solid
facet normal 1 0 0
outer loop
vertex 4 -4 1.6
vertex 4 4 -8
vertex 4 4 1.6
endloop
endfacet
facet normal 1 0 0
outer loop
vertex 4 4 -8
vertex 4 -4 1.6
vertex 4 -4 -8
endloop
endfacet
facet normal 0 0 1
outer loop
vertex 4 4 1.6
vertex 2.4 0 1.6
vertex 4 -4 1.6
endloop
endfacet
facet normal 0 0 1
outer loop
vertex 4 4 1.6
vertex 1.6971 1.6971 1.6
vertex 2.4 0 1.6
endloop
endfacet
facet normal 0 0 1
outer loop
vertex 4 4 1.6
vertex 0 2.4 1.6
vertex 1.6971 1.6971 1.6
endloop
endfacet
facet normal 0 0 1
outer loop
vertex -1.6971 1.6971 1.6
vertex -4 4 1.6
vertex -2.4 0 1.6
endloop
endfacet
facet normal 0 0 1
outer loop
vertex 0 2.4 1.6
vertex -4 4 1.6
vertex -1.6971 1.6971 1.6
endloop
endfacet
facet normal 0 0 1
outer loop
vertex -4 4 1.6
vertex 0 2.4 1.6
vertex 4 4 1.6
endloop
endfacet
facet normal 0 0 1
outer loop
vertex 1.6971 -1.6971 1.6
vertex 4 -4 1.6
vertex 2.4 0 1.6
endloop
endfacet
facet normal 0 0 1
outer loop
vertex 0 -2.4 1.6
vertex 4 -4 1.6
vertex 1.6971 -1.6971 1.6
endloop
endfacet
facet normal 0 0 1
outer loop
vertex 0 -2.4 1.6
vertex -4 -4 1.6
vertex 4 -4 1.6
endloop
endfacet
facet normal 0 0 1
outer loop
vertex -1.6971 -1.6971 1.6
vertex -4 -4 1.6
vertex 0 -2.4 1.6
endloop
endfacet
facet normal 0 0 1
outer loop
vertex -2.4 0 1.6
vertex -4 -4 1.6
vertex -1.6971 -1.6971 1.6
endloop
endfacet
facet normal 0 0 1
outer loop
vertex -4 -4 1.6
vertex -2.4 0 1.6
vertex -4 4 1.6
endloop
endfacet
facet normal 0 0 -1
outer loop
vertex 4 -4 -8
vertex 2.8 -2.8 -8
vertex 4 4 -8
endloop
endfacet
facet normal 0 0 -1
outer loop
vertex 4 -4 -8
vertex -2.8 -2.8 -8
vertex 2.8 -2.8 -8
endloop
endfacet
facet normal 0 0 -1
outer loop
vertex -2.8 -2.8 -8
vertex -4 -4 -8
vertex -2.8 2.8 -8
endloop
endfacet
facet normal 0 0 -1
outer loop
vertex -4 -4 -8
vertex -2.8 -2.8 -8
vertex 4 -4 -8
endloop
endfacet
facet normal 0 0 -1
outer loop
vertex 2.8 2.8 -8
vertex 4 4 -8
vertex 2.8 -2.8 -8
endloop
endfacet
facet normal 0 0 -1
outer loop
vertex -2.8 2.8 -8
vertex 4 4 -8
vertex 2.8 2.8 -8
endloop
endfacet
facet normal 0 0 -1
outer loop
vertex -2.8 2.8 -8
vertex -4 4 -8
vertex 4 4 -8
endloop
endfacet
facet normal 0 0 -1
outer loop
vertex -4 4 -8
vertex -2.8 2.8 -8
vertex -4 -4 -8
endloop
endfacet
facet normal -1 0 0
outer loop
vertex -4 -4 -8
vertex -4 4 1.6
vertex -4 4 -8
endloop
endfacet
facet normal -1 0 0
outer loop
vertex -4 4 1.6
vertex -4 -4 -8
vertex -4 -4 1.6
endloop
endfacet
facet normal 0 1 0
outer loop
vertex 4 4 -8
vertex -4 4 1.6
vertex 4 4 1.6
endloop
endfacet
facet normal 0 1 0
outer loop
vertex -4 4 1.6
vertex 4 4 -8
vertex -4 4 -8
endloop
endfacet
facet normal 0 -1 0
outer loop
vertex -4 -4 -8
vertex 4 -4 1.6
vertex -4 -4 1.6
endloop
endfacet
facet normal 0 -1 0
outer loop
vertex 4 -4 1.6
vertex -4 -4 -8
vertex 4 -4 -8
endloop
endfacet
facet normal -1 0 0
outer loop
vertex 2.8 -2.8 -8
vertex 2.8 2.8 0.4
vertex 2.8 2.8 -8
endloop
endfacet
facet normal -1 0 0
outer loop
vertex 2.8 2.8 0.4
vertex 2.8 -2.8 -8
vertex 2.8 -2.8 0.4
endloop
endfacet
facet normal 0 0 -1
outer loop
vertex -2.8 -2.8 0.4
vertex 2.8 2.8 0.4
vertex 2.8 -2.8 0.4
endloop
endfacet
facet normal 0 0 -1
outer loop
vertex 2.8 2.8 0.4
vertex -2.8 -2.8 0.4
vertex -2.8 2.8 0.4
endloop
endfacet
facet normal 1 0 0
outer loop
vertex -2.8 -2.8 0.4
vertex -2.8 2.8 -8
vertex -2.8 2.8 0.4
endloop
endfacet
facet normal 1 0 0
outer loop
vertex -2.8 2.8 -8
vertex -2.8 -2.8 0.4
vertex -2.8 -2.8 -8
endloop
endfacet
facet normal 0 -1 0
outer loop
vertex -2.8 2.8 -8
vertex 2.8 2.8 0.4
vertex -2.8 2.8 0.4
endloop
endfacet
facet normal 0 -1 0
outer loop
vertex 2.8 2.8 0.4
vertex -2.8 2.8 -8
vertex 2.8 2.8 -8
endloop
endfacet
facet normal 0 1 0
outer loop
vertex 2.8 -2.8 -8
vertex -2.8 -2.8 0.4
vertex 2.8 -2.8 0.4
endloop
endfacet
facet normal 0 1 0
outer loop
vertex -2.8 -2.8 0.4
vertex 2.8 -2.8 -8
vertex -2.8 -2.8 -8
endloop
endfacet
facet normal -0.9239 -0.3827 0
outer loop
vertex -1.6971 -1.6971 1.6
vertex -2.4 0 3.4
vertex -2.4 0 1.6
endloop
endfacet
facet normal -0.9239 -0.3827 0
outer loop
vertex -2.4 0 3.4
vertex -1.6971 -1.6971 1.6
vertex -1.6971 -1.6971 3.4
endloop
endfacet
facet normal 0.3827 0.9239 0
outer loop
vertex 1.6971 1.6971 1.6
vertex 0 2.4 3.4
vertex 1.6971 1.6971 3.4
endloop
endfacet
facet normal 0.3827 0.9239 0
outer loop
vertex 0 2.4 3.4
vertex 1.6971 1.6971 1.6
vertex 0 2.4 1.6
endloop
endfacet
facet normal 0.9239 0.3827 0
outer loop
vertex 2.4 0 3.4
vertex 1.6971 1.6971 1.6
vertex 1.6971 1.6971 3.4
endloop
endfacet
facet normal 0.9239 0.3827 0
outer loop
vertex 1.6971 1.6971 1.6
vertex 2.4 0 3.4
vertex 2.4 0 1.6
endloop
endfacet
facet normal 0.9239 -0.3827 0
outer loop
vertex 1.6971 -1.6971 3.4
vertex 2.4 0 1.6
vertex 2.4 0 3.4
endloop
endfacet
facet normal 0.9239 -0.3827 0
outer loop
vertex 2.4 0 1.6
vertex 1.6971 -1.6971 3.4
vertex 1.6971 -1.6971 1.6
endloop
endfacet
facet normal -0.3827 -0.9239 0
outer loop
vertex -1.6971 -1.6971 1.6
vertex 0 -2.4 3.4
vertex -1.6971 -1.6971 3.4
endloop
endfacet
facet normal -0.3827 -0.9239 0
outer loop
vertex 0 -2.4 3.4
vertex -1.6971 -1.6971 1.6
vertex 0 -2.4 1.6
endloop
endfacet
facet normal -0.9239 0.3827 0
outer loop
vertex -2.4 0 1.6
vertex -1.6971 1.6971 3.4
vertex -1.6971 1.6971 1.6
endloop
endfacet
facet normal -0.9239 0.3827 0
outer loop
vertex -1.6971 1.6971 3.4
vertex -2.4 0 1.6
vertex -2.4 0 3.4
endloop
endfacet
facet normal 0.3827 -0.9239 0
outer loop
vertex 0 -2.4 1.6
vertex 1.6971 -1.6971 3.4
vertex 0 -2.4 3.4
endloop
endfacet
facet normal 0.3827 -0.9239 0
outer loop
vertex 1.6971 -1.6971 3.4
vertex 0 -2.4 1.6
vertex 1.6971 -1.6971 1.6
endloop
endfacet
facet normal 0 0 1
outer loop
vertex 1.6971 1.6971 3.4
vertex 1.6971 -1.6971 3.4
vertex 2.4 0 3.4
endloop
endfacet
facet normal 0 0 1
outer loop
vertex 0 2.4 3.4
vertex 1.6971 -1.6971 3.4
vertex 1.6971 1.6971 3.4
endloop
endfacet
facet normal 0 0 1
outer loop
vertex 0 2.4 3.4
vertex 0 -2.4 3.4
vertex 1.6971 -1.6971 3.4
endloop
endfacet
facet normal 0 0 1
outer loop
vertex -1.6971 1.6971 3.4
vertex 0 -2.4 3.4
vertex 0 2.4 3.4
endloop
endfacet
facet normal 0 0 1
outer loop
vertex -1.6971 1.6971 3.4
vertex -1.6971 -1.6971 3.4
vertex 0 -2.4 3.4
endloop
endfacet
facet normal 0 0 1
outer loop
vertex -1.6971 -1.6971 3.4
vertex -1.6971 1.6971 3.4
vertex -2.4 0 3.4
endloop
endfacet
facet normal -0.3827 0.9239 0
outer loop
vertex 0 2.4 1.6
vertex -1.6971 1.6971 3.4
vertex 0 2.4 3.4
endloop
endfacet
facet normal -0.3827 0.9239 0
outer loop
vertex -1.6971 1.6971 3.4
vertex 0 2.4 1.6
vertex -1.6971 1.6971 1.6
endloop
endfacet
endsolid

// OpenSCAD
/**
 * Lego brick
 * @author Jakub Prusa
 * @documentation http://cdn.instructables.com/F65/PI3W/HDYZBK5Y/F65PI3WHDYZBK5Y.LARGE.jpg
 * @param num_x pocet pinu na ose x
 * @param num_y pocet pinu na ose y
 * @param num_z vyska na ose z ale ne v mm ale v jednotkach lega, obycejny dil ma vysky 3
 * @param smooth jestli dil ma byt hladky nebo ne (bez cudliku)
 * rozmery jednotlivych casti
 * prumer cudliku je 4.8 mm
 * vyska cudliku 1.8 mm
 * rozestup je 8 mm
 * vyska vrstvy bez cudliku je 3.2 mm
 * tlouska steny je 1.2 mm
 *
 * uvnitr kosticky nereste zadne cudliky jako v realu, staci ze bude prazdna a tlouska steny bude odpovidat parametru
 * a jak vite nektere lego dilky jsou hladke takze nemaji nahore ty cudliky. Na to je zde promena typu BOOL ktera se jmenuje smooth
 */


//#import("stls/lego_brick.stl");

module  lego_brick(
num_x=10,
num_y=2,
num_z=1,
smooth=false
) {

    prumerC   = 4.8;
    vyskaC    = 1.8;
    rezestupC = 8 - prumerC;
    vyskaUnit = 3.2;
    tloustkaS = 1.2;

    xK  = num_x*(rezestupC+prumerC);
    yK  = num_y*(rezestupC+prumerC);
    zK  = vyskaUnit * num_z;

    xPoz    = 0-(prumerC+rezestupC)/2;
    yPoz    = 0-(prumerC+rezestupC)/2;
    zPoz    = 0-zK+vyskaUnit/2;

    if (!smooth) {
        for (i=[0:num_x-1],j=[0:num_y-1]){
            translate([
                i*(rezestupC+prumerC),
                j*(rezestupC+prumerC),
                vyskaUnit/2
            ])
                cylinder( d=prumerC, h=vyskaC );
        }
    }


    difference() {
        translate([ xPoz, yPoz, zPoz ])
            cube([ xK, yK, zK ]);
        translate([ xPoz+tloustkaS, yPoz+tloustkaS, zPoz-tloustkaS ])
            cube([ xK-2*tloustkaS, yK-2*tloustkaS, zK ]);
    }


}

//lego_brick();
lego_brick(
    num_x=1,
    num_y=1,
    num_z=3,
    smooth=false
);
